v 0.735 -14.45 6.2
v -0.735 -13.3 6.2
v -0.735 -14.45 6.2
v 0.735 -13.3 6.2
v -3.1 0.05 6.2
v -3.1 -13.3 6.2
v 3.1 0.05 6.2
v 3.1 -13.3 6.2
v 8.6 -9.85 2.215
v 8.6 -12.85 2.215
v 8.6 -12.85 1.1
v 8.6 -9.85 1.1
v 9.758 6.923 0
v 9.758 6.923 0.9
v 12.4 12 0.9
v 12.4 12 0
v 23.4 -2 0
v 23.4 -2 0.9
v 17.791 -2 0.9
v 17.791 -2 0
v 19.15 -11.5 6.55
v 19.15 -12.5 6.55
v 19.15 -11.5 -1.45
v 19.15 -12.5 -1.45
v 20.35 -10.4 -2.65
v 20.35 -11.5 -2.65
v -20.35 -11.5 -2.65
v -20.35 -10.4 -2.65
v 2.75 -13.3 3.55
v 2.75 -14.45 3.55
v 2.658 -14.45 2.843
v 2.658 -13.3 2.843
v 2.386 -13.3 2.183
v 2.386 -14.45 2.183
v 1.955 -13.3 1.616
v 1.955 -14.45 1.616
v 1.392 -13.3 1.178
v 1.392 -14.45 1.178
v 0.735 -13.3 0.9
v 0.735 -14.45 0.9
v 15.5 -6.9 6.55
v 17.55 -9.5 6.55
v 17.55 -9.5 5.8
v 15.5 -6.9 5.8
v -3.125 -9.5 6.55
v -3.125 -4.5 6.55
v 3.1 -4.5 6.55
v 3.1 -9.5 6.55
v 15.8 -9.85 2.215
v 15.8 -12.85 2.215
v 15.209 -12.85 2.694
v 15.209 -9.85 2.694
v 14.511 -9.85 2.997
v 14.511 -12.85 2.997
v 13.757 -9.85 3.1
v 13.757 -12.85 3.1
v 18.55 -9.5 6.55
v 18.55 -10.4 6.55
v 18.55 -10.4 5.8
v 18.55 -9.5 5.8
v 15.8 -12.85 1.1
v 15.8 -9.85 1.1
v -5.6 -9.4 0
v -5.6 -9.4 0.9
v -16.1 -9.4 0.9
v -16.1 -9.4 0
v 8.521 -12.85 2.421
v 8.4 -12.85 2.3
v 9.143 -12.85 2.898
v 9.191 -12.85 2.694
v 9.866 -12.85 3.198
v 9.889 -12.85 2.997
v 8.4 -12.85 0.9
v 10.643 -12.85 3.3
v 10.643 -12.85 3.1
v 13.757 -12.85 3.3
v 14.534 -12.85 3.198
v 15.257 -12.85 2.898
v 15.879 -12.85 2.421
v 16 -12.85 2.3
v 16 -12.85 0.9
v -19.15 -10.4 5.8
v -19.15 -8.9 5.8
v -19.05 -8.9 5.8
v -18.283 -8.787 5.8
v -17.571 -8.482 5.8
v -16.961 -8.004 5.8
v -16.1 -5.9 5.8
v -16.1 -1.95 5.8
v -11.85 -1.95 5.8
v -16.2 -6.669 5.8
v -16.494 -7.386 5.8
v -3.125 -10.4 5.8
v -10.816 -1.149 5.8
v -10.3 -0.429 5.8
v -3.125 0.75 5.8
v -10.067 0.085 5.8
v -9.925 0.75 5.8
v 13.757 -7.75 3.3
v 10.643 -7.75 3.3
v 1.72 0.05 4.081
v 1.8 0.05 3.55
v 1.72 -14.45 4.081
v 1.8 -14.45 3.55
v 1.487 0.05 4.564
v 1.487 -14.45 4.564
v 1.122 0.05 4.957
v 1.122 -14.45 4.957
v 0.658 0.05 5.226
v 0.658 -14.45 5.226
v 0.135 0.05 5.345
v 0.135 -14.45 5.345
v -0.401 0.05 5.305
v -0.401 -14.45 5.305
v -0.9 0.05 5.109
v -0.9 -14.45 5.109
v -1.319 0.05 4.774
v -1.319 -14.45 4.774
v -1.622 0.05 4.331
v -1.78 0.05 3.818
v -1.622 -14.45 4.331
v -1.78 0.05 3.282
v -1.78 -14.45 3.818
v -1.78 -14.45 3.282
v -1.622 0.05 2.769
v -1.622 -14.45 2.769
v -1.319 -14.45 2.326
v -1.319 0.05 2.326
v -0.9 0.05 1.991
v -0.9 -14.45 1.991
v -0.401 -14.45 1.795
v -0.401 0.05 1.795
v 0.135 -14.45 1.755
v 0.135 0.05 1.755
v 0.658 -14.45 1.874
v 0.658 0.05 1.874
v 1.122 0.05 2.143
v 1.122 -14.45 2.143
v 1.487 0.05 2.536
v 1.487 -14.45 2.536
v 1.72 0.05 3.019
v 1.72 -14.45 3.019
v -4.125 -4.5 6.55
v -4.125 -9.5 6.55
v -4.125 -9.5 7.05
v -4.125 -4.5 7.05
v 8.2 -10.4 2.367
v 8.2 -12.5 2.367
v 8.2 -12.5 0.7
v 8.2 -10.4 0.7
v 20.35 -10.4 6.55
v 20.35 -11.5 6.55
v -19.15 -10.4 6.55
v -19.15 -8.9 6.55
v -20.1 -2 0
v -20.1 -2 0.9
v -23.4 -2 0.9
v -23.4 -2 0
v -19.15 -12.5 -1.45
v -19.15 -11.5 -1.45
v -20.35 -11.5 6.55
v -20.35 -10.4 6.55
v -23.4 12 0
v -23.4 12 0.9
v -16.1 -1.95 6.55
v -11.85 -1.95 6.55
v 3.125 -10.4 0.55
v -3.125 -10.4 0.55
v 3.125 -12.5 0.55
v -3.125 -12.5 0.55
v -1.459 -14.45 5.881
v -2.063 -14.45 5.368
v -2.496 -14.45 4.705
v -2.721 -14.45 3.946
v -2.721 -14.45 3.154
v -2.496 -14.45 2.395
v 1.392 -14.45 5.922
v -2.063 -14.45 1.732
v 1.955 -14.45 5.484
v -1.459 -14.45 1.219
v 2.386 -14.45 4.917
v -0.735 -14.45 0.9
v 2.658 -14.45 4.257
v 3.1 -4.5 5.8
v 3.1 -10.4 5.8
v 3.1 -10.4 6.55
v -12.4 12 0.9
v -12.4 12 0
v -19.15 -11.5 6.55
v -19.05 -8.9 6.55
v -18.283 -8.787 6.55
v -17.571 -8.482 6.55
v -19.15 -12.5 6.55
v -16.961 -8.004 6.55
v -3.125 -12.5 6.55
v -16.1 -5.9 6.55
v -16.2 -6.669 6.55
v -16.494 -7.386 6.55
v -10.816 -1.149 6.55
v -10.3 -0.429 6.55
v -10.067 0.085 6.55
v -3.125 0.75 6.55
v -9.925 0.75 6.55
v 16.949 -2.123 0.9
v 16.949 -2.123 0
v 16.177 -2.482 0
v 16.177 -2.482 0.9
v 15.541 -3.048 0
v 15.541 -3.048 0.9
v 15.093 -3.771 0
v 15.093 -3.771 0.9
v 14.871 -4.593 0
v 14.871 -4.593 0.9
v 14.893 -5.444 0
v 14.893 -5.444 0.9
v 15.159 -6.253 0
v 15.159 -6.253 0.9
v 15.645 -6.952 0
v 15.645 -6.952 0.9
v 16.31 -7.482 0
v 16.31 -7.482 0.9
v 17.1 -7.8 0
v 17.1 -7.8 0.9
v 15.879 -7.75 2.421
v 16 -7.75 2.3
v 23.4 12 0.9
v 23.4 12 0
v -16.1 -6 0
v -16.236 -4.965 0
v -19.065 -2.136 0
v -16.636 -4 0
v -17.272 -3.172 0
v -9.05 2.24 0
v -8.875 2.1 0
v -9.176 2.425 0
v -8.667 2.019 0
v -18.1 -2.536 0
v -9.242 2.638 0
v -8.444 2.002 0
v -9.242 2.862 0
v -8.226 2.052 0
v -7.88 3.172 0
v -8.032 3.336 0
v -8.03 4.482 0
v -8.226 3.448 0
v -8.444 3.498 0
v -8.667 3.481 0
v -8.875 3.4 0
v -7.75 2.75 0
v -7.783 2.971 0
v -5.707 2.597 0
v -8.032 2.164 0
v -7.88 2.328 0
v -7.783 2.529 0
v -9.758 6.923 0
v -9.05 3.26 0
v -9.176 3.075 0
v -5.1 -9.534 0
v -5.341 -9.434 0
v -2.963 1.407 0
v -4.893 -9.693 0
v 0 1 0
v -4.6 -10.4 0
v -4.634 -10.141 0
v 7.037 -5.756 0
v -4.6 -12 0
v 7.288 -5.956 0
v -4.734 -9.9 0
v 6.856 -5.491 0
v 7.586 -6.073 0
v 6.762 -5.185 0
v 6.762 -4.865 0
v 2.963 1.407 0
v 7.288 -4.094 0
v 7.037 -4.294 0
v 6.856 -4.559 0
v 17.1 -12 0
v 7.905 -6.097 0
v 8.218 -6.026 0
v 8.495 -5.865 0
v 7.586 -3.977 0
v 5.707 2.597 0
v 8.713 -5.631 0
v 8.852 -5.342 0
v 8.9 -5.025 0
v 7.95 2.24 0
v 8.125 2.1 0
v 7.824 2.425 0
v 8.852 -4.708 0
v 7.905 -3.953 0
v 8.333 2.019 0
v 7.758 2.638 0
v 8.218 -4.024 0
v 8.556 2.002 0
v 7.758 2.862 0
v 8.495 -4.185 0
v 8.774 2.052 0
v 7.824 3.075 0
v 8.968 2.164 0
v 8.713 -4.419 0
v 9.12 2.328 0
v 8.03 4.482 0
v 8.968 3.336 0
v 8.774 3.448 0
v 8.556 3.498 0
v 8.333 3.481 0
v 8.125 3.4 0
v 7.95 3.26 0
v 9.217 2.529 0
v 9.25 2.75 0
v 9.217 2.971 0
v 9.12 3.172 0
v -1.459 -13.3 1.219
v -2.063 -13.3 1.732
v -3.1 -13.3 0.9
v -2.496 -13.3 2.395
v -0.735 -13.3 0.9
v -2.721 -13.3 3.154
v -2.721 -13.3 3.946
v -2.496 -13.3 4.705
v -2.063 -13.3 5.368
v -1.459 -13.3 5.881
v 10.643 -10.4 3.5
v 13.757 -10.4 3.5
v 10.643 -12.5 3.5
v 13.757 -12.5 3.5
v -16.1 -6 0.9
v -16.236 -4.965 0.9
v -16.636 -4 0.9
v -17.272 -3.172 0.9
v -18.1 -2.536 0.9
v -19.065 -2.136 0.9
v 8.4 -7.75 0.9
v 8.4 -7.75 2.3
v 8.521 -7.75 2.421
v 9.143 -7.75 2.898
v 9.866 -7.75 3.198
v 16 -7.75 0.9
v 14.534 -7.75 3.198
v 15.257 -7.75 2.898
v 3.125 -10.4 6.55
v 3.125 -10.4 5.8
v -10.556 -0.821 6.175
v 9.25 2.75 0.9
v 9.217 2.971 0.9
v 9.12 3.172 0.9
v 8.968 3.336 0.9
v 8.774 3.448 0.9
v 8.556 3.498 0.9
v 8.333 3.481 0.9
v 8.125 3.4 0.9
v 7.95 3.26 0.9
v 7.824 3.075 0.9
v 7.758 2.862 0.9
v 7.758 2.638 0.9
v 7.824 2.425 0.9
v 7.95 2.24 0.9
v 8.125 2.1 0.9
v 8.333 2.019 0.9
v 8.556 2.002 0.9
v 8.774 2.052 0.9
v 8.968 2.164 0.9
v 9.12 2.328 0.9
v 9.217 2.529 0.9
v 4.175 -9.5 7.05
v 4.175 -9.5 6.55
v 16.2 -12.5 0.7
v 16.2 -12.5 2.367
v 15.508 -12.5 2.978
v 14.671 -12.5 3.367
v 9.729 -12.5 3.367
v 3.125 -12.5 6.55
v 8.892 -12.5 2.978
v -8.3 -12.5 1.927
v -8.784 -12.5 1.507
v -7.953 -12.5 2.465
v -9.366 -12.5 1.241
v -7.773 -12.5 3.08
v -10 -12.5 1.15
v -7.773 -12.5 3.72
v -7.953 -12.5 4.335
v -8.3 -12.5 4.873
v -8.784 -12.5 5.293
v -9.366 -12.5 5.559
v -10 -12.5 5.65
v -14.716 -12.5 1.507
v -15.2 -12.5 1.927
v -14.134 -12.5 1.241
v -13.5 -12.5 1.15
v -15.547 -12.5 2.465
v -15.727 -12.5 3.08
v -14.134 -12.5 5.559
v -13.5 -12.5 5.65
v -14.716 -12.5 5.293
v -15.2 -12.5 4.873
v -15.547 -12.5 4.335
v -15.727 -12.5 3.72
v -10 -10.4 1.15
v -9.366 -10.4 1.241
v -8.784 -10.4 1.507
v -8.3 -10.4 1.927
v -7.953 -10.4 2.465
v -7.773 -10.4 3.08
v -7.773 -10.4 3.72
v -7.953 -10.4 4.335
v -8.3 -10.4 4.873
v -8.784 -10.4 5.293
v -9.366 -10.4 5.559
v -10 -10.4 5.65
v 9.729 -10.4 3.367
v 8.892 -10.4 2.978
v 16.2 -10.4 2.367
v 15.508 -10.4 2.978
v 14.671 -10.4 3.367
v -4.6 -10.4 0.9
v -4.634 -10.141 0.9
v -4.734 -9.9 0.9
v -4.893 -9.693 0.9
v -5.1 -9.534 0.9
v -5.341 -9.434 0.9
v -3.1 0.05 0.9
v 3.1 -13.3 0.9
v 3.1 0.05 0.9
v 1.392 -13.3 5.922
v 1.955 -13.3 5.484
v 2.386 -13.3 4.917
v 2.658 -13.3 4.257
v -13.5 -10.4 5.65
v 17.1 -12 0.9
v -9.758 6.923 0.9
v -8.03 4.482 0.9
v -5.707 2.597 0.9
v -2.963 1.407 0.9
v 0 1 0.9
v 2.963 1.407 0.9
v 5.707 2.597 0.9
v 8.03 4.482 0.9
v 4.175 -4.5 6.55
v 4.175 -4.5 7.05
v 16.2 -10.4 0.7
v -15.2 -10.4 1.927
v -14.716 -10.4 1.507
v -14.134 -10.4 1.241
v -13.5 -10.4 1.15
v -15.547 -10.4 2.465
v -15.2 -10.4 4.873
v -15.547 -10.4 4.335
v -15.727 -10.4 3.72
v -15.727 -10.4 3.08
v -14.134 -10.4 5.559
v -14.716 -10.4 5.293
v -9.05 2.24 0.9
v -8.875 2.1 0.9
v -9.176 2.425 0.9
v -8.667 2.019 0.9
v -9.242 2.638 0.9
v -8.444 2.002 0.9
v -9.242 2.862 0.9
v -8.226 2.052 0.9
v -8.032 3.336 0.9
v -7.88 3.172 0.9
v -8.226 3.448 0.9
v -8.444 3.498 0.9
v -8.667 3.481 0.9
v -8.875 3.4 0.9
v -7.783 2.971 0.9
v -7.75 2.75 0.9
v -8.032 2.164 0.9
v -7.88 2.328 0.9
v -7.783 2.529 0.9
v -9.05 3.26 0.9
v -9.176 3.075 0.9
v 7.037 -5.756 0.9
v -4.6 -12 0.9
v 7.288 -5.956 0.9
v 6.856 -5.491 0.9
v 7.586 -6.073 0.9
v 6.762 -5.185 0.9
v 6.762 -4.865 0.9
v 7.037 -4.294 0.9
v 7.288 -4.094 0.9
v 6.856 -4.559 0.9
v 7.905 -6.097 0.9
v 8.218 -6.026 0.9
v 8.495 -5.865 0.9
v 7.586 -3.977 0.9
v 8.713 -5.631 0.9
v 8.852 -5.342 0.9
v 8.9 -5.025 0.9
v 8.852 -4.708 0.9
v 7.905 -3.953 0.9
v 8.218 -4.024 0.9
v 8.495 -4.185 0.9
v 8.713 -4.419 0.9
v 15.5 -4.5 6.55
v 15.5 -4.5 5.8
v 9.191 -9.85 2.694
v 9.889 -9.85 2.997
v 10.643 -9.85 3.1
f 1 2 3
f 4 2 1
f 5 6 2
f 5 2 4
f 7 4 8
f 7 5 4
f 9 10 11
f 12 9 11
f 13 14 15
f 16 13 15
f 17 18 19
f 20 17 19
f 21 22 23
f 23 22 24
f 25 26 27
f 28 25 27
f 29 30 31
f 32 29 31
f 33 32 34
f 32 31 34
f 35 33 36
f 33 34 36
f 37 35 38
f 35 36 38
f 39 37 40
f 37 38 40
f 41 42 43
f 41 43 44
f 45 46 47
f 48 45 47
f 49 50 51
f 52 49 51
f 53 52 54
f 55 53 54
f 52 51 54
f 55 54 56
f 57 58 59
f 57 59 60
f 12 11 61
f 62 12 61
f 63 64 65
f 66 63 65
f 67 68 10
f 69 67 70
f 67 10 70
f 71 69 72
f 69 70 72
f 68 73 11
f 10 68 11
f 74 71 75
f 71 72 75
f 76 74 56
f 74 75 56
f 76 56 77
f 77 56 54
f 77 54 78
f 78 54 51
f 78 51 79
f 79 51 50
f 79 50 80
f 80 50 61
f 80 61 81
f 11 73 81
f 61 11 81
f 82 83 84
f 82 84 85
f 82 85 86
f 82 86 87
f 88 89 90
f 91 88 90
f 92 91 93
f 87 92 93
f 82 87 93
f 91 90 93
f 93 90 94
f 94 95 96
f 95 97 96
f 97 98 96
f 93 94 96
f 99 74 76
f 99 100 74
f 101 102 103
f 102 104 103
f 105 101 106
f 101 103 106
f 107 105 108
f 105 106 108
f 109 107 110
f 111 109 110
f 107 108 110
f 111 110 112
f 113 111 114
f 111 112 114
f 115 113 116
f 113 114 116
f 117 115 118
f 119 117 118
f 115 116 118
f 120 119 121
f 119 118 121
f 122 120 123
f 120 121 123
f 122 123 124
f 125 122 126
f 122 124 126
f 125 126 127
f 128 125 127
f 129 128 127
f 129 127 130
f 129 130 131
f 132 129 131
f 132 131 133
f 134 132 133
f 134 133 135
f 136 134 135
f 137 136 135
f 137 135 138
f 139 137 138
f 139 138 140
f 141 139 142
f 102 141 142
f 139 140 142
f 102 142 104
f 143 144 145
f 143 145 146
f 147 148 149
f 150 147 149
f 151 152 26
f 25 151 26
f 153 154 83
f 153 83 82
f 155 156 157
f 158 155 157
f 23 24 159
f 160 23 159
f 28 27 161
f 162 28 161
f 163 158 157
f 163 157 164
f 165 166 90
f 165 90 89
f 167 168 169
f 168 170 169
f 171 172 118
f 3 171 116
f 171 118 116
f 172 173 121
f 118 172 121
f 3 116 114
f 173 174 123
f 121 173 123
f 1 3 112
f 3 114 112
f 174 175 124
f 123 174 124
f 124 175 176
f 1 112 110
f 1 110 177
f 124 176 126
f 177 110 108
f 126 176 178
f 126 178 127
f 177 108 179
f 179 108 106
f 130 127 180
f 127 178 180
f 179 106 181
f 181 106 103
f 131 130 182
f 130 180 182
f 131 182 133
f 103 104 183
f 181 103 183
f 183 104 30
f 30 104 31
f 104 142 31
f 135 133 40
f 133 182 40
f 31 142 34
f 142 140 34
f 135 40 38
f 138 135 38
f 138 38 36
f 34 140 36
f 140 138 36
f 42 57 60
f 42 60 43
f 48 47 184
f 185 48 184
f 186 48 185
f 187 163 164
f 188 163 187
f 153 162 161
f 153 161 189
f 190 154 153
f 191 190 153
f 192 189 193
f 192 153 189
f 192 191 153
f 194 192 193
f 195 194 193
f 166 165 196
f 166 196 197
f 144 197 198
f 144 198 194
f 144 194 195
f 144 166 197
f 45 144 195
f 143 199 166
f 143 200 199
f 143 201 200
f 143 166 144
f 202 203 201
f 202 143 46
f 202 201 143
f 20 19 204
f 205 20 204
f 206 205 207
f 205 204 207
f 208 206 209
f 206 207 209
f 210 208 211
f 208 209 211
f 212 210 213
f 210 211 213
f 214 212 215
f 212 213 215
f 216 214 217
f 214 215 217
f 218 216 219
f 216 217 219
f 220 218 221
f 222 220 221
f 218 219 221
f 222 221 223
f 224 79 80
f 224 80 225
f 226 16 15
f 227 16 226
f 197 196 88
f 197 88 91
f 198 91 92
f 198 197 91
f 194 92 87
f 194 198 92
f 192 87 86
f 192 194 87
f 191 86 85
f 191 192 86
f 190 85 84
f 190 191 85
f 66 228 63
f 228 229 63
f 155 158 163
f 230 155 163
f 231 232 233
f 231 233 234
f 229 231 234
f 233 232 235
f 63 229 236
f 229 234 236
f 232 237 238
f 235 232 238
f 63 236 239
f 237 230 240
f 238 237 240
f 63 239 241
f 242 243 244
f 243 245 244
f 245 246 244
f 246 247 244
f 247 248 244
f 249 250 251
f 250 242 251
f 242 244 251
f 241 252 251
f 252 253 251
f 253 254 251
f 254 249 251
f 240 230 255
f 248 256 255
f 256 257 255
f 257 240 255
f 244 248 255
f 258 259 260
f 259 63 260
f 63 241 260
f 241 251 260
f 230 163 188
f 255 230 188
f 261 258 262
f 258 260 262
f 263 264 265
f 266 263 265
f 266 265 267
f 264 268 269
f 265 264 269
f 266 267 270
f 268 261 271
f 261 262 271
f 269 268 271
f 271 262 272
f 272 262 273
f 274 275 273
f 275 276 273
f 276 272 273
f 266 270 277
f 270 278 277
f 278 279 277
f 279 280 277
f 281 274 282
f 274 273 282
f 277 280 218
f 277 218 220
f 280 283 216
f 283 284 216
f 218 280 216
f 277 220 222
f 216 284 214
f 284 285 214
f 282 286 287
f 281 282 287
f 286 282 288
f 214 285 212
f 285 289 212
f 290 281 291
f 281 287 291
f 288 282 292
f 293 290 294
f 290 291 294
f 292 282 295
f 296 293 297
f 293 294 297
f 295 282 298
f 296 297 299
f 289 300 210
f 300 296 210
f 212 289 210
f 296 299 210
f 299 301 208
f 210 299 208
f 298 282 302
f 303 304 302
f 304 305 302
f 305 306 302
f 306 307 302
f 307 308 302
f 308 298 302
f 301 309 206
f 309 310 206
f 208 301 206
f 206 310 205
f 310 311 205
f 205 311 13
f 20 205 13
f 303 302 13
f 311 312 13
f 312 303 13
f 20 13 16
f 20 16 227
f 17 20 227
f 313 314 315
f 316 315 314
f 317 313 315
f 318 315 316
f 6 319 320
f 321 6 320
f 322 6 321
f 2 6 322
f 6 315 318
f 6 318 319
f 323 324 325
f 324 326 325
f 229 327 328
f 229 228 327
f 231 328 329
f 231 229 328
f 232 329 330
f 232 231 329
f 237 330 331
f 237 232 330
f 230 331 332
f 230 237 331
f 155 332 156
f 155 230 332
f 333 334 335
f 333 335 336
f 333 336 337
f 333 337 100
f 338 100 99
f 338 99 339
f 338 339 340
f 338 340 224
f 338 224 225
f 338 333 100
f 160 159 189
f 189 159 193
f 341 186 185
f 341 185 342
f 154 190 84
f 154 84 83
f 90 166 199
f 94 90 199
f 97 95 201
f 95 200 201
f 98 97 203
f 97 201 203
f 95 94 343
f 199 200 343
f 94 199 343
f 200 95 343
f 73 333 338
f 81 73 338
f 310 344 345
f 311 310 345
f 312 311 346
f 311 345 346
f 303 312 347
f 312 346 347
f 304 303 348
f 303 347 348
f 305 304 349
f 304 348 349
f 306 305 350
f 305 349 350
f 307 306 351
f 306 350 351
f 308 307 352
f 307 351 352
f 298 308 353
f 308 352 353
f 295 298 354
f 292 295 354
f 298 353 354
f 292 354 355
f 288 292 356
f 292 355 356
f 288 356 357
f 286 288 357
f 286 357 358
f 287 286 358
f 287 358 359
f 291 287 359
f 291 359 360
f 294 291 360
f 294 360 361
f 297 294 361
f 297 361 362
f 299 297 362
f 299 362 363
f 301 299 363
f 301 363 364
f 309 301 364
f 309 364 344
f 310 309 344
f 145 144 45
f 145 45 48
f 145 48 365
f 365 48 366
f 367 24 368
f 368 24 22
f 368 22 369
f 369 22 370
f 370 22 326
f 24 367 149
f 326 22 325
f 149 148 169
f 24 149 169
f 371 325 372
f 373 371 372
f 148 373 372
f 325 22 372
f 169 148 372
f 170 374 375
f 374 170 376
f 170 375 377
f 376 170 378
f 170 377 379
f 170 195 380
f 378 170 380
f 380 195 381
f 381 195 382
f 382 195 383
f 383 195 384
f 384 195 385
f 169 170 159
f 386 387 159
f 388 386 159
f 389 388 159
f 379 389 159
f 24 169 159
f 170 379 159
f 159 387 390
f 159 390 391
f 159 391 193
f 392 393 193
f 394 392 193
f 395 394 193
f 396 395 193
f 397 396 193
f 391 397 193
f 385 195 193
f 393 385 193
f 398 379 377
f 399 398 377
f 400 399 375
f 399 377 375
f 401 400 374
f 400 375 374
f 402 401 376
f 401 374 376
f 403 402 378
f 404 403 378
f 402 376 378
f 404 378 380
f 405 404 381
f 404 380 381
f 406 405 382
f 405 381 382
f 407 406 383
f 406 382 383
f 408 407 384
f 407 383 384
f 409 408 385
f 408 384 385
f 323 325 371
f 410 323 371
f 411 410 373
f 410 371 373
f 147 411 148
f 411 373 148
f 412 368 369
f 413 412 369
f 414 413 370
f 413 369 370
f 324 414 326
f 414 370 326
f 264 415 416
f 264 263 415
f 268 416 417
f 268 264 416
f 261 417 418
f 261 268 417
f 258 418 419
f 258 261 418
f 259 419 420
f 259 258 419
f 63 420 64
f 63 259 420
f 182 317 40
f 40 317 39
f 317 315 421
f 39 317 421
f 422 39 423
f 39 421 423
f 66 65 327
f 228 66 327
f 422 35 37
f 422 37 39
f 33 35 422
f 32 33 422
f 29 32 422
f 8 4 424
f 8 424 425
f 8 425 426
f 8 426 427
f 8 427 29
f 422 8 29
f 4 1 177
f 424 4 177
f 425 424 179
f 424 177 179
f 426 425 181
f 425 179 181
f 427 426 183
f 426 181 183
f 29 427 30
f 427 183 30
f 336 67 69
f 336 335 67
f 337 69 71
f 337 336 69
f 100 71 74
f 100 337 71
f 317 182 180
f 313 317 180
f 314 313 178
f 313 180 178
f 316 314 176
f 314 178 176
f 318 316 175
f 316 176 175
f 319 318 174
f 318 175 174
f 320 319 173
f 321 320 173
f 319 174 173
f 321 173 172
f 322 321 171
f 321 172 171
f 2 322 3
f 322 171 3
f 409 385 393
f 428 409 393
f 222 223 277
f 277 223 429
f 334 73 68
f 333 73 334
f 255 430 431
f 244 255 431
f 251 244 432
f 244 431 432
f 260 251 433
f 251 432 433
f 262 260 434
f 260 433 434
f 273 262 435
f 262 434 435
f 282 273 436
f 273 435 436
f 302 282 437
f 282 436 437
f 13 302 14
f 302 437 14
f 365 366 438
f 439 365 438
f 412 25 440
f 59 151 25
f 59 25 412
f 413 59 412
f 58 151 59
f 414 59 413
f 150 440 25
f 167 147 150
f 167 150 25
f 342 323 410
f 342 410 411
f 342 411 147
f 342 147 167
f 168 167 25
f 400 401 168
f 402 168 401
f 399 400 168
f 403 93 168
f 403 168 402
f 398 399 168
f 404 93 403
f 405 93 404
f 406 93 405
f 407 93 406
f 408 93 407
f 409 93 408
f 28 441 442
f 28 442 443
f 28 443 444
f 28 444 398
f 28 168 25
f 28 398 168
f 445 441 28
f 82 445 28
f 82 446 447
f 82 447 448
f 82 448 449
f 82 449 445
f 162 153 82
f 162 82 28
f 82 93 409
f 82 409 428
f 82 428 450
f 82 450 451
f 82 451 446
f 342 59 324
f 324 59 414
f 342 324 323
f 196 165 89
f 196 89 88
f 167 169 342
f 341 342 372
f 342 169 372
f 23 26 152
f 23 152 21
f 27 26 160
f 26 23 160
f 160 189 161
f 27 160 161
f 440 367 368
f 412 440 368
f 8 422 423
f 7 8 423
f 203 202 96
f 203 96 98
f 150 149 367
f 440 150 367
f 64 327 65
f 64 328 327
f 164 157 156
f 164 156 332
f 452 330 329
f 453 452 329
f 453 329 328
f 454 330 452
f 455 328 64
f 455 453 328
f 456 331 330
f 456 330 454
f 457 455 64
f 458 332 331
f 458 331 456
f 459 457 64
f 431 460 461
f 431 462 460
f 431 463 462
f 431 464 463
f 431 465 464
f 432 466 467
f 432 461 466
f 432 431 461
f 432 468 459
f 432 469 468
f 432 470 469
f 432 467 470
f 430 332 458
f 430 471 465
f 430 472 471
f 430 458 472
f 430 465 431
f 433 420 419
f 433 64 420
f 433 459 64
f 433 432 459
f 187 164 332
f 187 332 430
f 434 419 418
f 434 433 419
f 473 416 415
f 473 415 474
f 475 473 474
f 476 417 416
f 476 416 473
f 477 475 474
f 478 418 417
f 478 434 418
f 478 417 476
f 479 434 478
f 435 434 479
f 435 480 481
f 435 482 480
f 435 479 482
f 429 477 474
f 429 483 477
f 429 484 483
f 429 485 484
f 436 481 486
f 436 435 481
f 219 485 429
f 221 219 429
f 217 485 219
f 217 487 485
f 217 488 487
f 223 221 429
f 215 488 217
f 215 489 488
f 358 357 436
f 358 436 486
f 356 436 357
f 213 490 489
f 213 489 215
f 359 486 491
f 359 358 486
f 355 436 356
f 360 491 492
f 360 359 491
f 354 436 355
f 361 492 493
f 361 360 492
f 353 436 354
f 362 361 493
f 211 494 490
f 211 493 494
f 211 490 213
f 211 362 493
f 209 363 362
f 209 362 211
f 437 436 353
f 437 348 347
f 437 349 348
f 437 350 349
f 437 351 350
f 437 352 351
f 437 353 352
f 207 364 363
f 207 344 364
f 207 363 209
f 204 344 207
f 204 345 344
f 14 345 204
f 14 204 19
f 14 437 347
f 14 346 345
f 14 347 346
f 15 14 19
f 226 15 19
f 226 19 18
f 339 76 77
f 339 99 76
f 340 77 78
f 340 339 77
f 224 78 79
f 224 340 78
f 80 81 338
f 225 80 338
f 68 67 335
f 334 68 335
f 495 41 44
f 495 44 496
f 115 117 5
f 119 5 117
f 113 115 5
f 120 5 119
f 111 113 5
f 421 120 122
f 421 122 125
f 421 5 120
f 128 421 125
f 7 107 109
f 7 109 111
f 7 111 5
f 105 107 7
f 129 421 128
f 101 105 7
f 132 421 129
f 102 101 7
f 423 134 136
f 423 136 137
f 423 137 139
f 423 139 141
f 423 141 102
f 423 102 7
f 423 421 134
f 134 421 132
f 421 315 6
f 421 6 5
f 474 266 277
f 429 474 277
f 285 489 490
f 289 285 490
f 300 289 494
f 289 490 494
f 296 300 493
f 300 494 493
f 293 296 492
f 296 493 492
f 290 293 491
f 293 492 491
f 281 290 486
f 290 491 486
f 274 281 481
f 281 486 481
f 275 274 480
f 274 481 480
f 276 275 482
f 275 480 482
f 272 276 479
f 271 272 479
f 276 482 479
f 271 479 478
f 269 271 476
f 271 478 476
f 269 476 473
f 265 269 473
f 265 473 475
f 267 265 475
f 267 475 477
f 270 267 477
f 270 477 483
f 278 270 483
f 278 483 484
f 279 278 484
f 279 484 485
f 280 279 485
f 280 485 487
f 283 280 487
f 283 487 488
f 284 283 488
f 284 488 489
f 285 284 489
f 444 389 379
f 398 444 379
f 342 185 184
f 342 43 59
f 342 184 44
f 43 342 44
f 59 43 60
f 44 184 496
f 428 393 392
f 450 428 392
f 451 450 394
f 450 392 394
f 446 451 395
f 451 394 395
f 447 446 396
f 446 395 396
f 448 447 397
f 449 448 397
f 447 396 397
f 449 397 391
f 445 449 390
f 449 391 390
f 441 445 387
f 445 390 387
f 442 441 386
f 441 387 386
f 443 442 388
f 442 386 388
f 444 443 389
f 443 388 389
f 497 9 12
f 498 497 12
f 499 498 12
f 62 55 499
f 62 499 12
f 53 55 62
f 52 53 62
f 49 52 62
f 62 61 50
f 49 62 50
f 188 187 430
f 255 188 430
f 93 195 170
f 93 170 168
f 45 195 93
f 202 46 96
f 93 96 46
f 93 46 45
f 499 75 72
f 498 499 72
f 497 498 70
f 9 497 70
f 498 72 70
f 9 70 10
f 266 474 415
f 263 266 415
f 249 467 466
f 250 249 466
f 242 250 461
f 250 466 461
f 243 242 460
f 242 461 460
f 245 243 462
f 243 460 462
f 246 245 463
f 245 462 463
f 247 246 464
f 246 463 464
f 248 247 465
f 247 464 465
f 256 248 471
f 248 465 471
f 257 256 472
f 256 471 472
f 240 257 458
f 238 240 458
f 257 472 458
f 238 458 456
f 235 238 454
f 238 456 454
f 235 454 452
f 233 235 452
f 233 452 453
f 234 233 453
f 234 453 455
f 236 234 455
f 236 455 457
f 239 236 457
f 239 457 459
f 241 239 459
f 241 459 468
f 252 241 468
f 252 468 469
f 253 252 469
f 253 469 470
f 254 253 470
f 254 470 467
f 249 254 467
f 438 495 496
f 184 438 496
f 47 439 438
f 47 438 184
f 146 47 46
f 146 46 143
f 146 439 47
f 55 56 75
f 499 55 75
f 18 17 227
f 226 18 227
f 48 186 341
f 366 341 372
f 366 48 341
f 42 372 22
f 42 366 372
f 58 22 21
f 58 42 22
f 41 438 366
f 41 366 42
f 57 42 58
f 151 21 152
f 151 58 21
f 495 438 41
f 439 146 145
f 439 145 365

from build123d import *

# Parameters (mm, degrees)
F0_W      = 46.8
F0_H      = 24
F1_DEPTH  = 0.9
F3_DEPTH  = 25
F4_R      = 1
F5_R      = 4
F6_R      = 0.75
F7_DEPTH  = 25
F8_R      = 1.075
F9_DEPTH  = 25
F10_W     = 7.6
F10_H     = 5.1
F11_DEPTH = 2.4
F12_SIZE  = 1
F13_R     = 3
F15_DEPTH = 3
F16_W     = 6.2
F16_H     = 14.5
F17_DEPTH = 5.3
F18_R     = 1.8
F19_DEPTH = 14.5
F20_R     = 1.8
F21_DEPTH = 1.15
F24_DEPTH = 1
F26_DEPTH = 1.1
F28_DEPTH = 0.75
F29_W     = 8.3
F29_H     = 5
F30_DEPTH = 0.5
F32_DEPTH = 0.75
F34_DEPTH = 25


with BuildPart() as f1:
    # F0 (on Top) → F1 (new body)
    with BuildSketch(Plane.XY):
        Rectangle(F0_W, F0_H)
    extrude(amount=F1_DEPTH)

    # F2 (on face) → F3 (cut)
    with BuildSketch(Plane.XY.offset(0.9)):
        Polygon((-16.1, -2), (-23.4, -2), (-23.4, -12), (-16.1, -12), (-4.6, -12), (-4.6, -9.4), (-16.1, -9.4), align=None)
        with BuildLine():
            Line((-12.4, 12), (-9.7580645161, 6.9225816699))
            ThreePointArc((-9.7580645161, 6.9225816699), (0, 1), (9.7580645161, 6.9225816699))
            Line((9.7580645161, 6.9225816699), (12.4, 12))
            Line((12.4, 12), (-12.4, 12))
        make_face()
        with BuildLine():
            Line((17.1, -12), (23.4, -12))
            Line((23.4, -12), (23.4, -2))
            Line((23.4, -2), (17.7911840902, -2))
            ThreePointArc((17.7911840902, -2), (14.8706646396, -4.5931467489), (17.1, -7.8))
            Line((17.1, -7.8), (17.1, -12))
        make_face()
    extrude(amount=-F3_DEPTH, mode=Mode.SUBTRACT)

    # F4
    f4_edges = [f1.edges().sort_by_distance(p)[0] for p in [
        (-4.6, -9.4, 0.45),
    ]]
    fillet(f4_edges, radius=F4_R)

    # F5
    f5_edges = [f1.edges().sort_by_distance(p)[0] for p in [
        (-16.1, -2, 0.45),
    ]]
    fillet(f5_edges, radius=F5_R)

    # F6 (on face) → F7 (cut)
    with BuildSketch(Plane.XY.offset(0.9)):
        with Locations((-8.5, 2.75)):
            Circle(F6_R)
        with Locations((8.5, 2.75)):
            Circle(F6_R)
    extrude(amount=-F7_DEPTH, mode=Mode.SUBTRACT)

    # F8 (on face) → F9 (cut)
    with BuildSketch(Plane.XY.offset(0.9)):
        with Locations((7.825, -5.025)):
            Circle(F8_R)
    extrude(amount=-F9_DEPTH, mode=Mode.SUBTRACT)


with BuildPart() as f11:
    # F10 (on face) → F11 (new body)
    with BuildSketch(Plane.XY.offset(0.9)):
        with Locations((12.2, -10.3)):
            Rectangle(F10_W, F10_H)
    extrude(amount=F11_DEPTH)

    # F12
    f12_edges = [f11.edges().sort_by_distance(p)[0] for p in [
        (8.4, -10.3, 3.3),
        (16, -10.3, 3.3),
    ]]
    chamfer(f12_edges, length=F12_SIZE)

    # F13
    f13_edges = [f11.edges().sort_by_distance(p)[0] for p in [
        (9.4, -10.3, 3.3),
        (15, -10.3, 3.3),
    ]]
    fillet(f13_edges, radius=F13_R)

    # F14 (on face) → F15 (cut)
    with BuildSketch(Plane.XZ.offset(12.85)):
        with BuildLine():
            Line((13.7573593129, 3.1), (10.6426406871, 3.1))
            ThreePointArc((10.6426406871, 3.1), (9.5296016157, 2.8692691618), (8.6, 2.2151028754))
            Line((8.6, 2.2151028754), (8.6, 1.1))
            Line((8.6, 1.1), (15.8, 1.1))
            Line((15.8, 1.1), (15.8, 2.2151028754))
            ThreePointArc((15.8, 2.2151028754), (14.8703983843, 2.8692691618), (13.7573593129, 3.1))
        make_face()
    extrude(amount=-F15_DEPTH, mode=Mode.SUBTRACT)


with BuildPart() as f17:
    # F16 (on face) → F17 (new body)
    with BuildSketch(Plane.XY.offset(0.9)):
        with Locations((0, -7.2)):
            Rectangle(F16_W, F16_H)
    extrude(amount=F17_DEPTH)

    # F18 (on face) → F19 (cut, through all)
    with BuildSketch(Plane.XZ.offset(14.45)):
        with Locations((0, 3.55)):
            Circle(F18_R)
    extrude(amount=-F19_DEPTH, mode=Mode.SUBTRACT)

    # F20 (on face) → F21 (cut)
    with BuildSketch(Plane.XZ.offset(14.45)):
        with Locations((0, 3.55)):
            Circle(F20_R)
        with BuildLine():
            Line((-0.7348469228, 6.2), (0.7348469228, 6.2))
            ThreePointArc((0.7348469228, 6.2), (0, 6.3), (-0.7348469228, 6.2))
        make_face()
        with BuildLine():
            ThreePointArc((-0.7348469228, 0.9), (0, 0.8), (0.7348469228, 0.9))
            Line((0.7348469228, 0.9), (-0.7348469228, 0.9))
        make_face()
        with BuildLine():
            ThreePointArc((-0.7348469228, 0.9), (-2.75, 3.55), (-0.7348469228, 6.2))
            Line((-0.7348469228, 6.2), (-3.1, 6.2))
            Line((-3.1, 6.2), (-3.1, 0.9))
            Line((-3.1, 0.9), (-0.7348469228, 0.9))
        make_face()
        with BuildLine():
            ThreePointArc((0.7348469228, 6.2), (2.1889870988, 5.2145826748), (2.75, 3.55))
            ThreePointArc((2.75, 3.55), (2.1889870988, 1.8854173252), (0.7348469228, 0.9))
            Line((0.7348469228, 0.9), (3.1, 0.9))
            Line((3.1, 0.9), (3.1, 6.2))
            Line((3.1, 6.2), (0.7348469228, 6.2))
        make_face()
    extrude(amount=-F21_DEPTH, mode=Mode.SUBTRACT)


with BuildPart() as f24:
    # F23 (on offset) → F24 (new body)
    with BuildSketch(Plane(origin=(0, -12.5, 0), x_dir=(-1, 0, 0), z_dir=(0, 1, 0))):
        Polygon((19.15, -1.45), (19.15, 6.55), (3.125, 6.55), (3.125, 0.55), (-3.125, 0.55), (-3.125, 6.55), (-19.15, 6.55), (-19.15, -1.45), align=None)
        with BuildLine():
            Line((-16.2, 0.7), (-16.2, 2.3672461086))
            ThreePointArc((-16.2, 2.3672461086), (-15.1036156875, 3.2030318245), (-13.7573593129, 3.5))
            Line((-13.7573593129, 3.5), (-10.6426406871, 3.5))
            ThreePointArc((-10.6426406871, 3.5), (-9.2963843125, 3.2030318245), (-8.2, 2.3672461086))
            Line((-8.2, 2.3672461086), (-8.2, 0.7))
            Line((-8.2, 0.7), (-16.2, 0.7))
        make_face(mode=Mode.SUBTRACT)
    extrude(amount=F24_DEPTH)

    # F25 (on face) → F26 (join)
    with BuildSketch(Plane(origin=(0, -11.5, 0), x_dir=(-1, 0, 0), z_dir=(0, 1, 0))):
        Polygon((20.35, -2.65), (20.35, 6.55), (3.125, 6.55), (3.125, 0.55), (-3.125, 0.55), (-3.125, 6.55), (-20.35, 6.55), (-20.35, -2.65), align=None)
        with BuildLine():
            Line((-13.7573593129, 3.5), (-10.6426406871, 3.5))
            ThreePointArc((-10.6426406871, 3.5), (-9.2963843125, 3.2030318245), (-8.2, 2.3672461086))
            Line((-8.2, 2.3672461086), (-8.2, 0.7))
            Line((-8.2, 0.7), (-16.2, 0.7))
            Line((-16.2, 0.7), (-16.2, 2.3672461086))
            ThreePointArc((-16.2, 2.3672461086), (-15.1036156875, 3.2030318245), (-13.7573593129, 3.5))
        make_face(mode=Mode.SUBTRACT)
    extrude(amount=F26_DEPTH)

    # F27 (on face) → F28 (join)
    with BuildSketch(Plane.XY.offset(6.55)):
        with BuildLine():
            Line((-19.15, -10.4), (-3.125, -10.4))
            Line((-3.125, -10.4), (-3.125, 0.75))
            Line((-3.125, 0.75), (-9.925, 0.75))
            add(Edge.make_bspline(
                [(-11.85, -1.95), (-10.9984157607, -1.39684428), (-10.6160626022, -0.9492889302), (-9.9995483018, 0), (-9.925, 0.75)],
                knots=[0, 0, 0, 0, 0.5017533344, 1, 1, 1, 1], degree=3))
            Line((-11.85, -1.95), (-16.1, -1.95))
            Line((-16.1, -1.95), (-16.1, -5.9004166956))
            ThreePointArc((-16.1, -5.9004166956), (-16.9610750364, -8.0039850924), (-19.05, -8.9))
            ThreePointArc((-19.05, -8.9), (-19.1, -8.9004166956), (-19.15, -8.9))
            Line((-19.15, -8.9), (-19.15, -10.4))
        make_face()
        with BuildLine():
            Line((-19.05, -8.9), (-19.15, -8.9))
            ThreePointArc((-19.15, -8.9), (-19.1, -8.9004166956), (-19.05, -8.9))
        make_face()
    extrude(amount=-F28_DEPTH)

    # F29 (on face) → F30 (join)
    with BuildSketch(Plane.XY.offset(6.55)):
        with Locations((0.025, -7)):
            Rectangle(F29_W, F29_H)
    extrude(amount=F30_DEPTH)

    # F31 (on face) → F32 (join, through all)
    with BuildSketch(Plane.XY.offset(6.55)):
        Polygon((15.5, -4.5), (3.1, -4.5), (3.1, -10.4), (15.5, -10.4), (18.55, -10.4), (18.55, -9.5), (17.55, -9.5), (15.5, -6.9), align=None)
    extrude(amount=-F32_DEPTH)

    # F33 (on face) → F34 (cut)
    with BuildSketch(Plane.XZ.offset(12.5)):
        with BuildLine():
            Line((-10, 5.65), (-13.5, 5.65))
            ThreePointArc((-13.5, 5.65), (-15.75, 3.4), (-13.5, 1.15))
            Line((-13.5, 1.15), (-10, 1.15))
            ThreePointArc((-10, 1.15), (-7.75, 3.4), (-10, 5.65))
        make_face()
    extrude(amount=-F34_DEPTH, mode=Mode.SUBTRACT)


solid = Compound([f1.part, f11.part, f17.part, f24.part])
